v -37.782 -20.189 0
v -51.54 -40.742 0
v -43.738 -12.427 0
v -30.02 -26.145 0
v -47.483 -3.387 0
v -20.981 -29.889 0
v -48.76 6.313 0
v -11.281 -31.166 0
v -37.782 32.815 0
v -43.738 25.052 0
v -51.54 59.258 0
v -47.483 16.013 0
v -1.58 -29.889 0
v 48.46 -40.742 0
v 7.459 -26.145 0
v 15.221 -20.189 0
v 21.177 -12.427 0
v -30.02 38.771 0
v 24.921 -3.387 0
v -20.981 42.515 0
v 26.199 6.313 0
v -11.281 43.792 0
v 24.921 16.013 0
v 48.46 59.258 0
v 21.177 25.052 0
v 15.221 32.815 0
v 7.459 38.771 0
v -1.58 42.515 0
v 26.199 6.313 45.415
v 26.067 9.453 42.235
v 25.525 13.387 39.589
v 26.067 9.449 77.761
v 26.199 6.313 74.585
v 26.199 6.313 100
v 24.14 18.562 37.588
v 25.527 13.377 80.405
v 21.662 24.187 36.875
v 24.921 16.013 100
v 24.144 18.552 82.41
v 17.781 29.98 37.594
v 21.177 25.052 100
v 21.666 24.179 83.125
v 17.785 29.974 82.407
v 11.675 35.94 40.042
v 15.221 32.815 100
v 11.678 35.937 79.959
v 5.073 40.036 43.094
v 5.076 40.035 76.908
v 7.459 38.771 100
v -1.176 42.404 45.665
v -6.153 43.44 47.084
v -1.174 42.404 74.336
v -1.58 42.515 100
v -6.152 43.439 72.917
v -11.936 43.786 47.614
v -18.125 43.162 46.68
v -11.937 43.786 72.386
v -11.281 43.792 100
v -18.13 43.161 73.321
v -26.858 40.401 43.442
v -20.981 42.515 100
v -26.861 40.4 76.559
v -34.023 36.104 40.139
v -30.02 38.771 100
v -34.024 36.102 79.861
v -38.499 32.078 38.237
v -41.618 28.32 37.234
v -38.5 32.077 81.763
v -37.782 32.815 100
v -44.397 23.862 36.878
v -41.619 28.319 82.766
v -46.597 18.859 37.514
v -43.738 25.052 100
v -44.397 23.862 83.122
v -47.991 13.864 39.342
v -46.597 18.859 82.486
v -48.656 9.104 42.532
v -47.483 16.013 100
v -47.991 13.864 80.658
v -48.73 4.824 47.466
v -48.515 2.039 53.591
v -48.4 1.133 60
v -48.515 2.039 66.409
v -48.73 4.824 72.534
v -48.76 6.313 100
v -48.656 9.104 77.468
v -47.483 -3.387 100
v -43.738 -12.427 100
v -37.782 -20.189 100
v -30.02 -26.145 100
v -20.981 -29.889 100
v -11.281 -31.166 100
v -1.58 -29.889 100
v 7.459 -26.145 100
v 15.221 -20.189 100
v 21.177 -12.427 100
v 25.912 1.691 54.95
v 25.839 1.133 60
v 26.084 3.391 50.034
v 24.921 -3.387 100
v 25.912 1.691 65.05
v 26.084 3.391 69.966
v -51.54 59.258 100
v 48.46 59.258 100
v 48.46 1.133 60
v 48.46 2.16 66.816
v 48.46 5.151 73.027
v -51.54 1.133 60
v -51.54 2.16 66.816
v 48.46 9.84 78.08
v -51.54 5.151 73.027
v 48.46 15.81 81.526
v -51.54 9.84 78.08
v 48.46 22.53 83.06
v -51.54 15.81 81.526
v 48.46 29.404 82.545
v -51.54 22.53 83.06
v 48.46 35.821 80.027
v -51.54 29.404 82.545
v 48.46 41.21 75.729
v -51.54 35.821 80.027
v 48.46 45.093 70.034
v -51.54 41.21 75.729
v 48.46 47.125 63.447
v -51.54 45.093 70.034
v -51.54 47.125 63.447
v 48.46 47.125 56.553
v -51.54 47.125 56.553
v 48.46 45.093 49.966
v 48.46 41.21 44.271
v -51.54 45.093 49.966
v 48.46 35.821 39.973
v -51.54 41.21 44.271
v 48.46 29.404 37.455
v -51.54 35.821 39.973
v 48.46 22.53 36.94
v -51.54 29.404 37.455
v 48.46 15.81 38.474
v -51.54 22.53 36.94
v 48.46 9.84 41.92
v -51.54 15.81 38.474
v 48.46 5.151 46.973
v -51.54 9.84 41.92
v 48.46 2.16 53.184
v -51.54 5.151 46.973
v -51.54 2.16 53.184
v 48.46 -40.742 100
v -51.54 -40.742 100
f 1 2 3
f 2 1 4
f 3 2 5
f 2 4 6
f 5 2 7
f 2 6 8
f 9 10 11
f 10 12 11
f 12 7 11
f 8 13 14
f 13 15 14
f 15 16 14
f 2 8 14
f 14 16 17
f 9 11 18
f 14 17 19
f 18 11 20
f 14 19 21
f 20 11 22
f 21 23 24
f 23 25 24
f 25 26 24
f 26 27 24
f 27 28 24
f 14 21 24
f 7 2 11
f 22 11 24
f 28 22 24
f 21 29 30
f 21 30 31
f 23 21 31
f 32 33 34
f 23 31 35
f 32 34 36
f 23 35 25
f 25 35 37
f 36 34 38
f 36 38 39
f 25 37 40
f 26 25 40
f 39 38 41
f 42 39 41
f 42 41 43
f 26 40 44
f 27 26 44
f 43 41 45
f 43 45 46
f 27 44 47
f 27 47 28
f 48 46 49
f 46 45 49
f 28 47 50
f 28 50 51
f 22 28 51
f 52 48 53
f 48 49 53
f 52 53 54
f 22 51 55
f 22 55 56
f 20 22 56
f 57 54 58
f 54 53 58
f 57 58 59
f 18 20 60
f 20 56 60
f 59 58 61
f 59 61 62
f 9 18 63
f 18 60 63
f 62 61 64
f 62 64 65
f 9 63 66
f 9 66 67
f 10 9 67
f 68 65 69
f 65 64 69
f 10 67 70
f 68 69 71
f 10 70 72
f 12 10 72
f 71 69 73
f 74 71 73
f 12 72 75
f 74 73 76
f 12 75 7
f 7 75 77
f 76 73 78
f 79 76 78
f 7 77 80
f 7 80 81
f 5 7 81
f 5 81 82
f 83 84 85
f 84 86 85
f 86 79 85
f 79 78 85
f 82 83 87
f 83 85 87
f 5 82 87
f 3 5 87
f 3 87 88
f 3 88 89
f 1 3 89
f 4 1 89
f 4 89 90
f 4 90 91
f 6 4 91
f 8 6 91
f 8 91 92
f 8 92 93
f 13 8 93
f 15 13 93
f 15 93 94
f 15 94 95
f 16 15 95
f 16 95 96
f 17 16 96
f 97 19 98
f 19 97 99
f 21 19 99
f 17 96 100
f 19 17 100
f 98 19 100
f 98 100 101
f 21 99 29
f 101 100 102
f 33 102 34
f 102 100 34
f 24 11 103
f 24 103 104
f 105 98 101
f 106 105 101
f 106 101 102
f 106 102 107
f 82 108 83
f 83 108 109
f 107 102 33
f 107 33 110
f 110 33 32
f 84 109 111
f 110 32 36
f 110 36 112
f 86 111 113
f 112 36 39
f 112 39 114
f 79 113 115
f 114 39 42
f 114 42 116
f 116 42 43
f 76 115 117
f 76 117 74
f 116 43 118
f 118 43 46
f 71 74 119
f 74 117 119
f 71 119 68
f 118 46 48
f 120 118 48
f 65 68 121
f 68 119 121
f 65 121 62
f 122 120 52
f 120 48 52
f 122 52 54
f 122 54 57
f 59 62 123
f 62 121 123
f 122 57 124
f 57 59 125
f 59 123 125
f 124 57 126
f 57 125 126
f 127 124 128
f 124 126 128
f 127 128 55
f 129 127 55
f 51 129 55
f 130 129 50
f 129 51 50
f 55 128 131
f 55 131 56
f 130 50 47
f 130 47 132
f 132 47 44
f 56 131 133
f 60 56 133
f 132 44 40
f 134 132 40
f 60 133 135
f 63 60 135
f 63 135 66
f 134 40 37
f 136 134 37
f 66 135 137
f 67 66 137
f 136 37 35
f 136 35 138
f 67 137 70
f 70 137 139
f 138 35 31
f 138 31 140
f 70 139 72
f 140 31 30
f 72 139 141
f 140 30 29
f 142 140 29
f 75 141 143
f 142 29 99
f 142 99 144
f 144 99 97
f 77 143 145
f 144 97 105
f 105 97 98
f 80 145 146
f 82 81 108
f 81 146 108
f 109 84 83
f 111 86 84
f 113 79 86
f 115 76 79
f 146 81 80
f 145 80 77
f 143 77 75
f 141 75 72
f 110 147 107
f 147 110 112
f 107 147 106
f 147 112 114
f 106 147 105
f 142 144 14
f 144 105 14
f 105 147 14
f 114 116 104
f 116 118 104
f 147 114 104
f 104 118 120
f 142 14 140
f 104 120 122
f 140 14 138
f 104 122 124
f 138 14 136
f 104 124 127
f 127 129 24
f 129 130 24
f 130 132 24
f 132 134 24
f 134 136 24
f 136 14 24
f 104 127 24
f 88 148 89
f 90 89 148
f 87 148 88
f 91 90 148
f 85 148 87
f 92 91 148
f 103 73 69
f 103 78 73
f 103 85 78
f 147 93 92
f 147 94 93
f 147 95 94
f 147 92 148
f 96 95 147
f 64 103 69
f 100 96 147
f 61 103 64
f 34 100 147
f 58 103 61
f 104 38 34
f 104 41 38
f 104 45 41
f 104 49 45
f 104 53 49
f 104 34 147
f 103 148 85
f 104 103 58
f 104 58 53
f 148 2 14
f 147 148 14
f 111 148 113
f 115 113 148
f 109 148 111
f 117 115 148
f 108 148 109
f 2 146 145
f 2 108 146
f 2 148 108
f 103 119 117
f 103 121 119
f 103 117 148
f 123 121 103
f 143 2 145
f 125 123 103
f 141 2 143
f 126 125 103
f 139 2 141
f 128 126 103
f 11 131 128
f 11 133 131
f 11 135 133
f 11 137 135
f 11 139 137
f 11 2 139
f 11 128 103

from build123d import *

# Parameters (mm, degrees)
F0_W     = 100
F0_H     = 100
F1_DEPTH = 100
F2_R     = 37.4790948787
F3_DEPTH = 100.001
F4_R     = 23.1250184434
F5_DEPTH = 100.001


with BuildPart() as f1:
    # F0 (on Top) → F1 (new body)
    with BuildSketch(Plane.XY):
        with Locations((-1.539904009, 9.2580467463)):
            Rectangle(F0_W, F0_H)
    extrude(amount=F1_DEPTH)

    # F2 (on face) → F3 (cut, through all)
    with BuildSketch(Plane.XY.offset(100)):
        with Locations((-11.2805515528, 6.312854588)):
            Circle(F2_R)
    extrude(amount=-F3_DEPTH, mode=Mode.SUBTRACT)

    # F4 (on face) → F5 (cut, through all)
    with BuildSketch(Plane(origin=(-51.539904009, 0, 0), x_dir=(0, -1, 0), z_dir=(-1, 0, 0))):
        with Locations((-24.2580467463, 60)):
            Circle(F4_R)
    extrude(amount=-F5_DEPTH, mode=Mode.SUBTRACT)


solid = f1.part
